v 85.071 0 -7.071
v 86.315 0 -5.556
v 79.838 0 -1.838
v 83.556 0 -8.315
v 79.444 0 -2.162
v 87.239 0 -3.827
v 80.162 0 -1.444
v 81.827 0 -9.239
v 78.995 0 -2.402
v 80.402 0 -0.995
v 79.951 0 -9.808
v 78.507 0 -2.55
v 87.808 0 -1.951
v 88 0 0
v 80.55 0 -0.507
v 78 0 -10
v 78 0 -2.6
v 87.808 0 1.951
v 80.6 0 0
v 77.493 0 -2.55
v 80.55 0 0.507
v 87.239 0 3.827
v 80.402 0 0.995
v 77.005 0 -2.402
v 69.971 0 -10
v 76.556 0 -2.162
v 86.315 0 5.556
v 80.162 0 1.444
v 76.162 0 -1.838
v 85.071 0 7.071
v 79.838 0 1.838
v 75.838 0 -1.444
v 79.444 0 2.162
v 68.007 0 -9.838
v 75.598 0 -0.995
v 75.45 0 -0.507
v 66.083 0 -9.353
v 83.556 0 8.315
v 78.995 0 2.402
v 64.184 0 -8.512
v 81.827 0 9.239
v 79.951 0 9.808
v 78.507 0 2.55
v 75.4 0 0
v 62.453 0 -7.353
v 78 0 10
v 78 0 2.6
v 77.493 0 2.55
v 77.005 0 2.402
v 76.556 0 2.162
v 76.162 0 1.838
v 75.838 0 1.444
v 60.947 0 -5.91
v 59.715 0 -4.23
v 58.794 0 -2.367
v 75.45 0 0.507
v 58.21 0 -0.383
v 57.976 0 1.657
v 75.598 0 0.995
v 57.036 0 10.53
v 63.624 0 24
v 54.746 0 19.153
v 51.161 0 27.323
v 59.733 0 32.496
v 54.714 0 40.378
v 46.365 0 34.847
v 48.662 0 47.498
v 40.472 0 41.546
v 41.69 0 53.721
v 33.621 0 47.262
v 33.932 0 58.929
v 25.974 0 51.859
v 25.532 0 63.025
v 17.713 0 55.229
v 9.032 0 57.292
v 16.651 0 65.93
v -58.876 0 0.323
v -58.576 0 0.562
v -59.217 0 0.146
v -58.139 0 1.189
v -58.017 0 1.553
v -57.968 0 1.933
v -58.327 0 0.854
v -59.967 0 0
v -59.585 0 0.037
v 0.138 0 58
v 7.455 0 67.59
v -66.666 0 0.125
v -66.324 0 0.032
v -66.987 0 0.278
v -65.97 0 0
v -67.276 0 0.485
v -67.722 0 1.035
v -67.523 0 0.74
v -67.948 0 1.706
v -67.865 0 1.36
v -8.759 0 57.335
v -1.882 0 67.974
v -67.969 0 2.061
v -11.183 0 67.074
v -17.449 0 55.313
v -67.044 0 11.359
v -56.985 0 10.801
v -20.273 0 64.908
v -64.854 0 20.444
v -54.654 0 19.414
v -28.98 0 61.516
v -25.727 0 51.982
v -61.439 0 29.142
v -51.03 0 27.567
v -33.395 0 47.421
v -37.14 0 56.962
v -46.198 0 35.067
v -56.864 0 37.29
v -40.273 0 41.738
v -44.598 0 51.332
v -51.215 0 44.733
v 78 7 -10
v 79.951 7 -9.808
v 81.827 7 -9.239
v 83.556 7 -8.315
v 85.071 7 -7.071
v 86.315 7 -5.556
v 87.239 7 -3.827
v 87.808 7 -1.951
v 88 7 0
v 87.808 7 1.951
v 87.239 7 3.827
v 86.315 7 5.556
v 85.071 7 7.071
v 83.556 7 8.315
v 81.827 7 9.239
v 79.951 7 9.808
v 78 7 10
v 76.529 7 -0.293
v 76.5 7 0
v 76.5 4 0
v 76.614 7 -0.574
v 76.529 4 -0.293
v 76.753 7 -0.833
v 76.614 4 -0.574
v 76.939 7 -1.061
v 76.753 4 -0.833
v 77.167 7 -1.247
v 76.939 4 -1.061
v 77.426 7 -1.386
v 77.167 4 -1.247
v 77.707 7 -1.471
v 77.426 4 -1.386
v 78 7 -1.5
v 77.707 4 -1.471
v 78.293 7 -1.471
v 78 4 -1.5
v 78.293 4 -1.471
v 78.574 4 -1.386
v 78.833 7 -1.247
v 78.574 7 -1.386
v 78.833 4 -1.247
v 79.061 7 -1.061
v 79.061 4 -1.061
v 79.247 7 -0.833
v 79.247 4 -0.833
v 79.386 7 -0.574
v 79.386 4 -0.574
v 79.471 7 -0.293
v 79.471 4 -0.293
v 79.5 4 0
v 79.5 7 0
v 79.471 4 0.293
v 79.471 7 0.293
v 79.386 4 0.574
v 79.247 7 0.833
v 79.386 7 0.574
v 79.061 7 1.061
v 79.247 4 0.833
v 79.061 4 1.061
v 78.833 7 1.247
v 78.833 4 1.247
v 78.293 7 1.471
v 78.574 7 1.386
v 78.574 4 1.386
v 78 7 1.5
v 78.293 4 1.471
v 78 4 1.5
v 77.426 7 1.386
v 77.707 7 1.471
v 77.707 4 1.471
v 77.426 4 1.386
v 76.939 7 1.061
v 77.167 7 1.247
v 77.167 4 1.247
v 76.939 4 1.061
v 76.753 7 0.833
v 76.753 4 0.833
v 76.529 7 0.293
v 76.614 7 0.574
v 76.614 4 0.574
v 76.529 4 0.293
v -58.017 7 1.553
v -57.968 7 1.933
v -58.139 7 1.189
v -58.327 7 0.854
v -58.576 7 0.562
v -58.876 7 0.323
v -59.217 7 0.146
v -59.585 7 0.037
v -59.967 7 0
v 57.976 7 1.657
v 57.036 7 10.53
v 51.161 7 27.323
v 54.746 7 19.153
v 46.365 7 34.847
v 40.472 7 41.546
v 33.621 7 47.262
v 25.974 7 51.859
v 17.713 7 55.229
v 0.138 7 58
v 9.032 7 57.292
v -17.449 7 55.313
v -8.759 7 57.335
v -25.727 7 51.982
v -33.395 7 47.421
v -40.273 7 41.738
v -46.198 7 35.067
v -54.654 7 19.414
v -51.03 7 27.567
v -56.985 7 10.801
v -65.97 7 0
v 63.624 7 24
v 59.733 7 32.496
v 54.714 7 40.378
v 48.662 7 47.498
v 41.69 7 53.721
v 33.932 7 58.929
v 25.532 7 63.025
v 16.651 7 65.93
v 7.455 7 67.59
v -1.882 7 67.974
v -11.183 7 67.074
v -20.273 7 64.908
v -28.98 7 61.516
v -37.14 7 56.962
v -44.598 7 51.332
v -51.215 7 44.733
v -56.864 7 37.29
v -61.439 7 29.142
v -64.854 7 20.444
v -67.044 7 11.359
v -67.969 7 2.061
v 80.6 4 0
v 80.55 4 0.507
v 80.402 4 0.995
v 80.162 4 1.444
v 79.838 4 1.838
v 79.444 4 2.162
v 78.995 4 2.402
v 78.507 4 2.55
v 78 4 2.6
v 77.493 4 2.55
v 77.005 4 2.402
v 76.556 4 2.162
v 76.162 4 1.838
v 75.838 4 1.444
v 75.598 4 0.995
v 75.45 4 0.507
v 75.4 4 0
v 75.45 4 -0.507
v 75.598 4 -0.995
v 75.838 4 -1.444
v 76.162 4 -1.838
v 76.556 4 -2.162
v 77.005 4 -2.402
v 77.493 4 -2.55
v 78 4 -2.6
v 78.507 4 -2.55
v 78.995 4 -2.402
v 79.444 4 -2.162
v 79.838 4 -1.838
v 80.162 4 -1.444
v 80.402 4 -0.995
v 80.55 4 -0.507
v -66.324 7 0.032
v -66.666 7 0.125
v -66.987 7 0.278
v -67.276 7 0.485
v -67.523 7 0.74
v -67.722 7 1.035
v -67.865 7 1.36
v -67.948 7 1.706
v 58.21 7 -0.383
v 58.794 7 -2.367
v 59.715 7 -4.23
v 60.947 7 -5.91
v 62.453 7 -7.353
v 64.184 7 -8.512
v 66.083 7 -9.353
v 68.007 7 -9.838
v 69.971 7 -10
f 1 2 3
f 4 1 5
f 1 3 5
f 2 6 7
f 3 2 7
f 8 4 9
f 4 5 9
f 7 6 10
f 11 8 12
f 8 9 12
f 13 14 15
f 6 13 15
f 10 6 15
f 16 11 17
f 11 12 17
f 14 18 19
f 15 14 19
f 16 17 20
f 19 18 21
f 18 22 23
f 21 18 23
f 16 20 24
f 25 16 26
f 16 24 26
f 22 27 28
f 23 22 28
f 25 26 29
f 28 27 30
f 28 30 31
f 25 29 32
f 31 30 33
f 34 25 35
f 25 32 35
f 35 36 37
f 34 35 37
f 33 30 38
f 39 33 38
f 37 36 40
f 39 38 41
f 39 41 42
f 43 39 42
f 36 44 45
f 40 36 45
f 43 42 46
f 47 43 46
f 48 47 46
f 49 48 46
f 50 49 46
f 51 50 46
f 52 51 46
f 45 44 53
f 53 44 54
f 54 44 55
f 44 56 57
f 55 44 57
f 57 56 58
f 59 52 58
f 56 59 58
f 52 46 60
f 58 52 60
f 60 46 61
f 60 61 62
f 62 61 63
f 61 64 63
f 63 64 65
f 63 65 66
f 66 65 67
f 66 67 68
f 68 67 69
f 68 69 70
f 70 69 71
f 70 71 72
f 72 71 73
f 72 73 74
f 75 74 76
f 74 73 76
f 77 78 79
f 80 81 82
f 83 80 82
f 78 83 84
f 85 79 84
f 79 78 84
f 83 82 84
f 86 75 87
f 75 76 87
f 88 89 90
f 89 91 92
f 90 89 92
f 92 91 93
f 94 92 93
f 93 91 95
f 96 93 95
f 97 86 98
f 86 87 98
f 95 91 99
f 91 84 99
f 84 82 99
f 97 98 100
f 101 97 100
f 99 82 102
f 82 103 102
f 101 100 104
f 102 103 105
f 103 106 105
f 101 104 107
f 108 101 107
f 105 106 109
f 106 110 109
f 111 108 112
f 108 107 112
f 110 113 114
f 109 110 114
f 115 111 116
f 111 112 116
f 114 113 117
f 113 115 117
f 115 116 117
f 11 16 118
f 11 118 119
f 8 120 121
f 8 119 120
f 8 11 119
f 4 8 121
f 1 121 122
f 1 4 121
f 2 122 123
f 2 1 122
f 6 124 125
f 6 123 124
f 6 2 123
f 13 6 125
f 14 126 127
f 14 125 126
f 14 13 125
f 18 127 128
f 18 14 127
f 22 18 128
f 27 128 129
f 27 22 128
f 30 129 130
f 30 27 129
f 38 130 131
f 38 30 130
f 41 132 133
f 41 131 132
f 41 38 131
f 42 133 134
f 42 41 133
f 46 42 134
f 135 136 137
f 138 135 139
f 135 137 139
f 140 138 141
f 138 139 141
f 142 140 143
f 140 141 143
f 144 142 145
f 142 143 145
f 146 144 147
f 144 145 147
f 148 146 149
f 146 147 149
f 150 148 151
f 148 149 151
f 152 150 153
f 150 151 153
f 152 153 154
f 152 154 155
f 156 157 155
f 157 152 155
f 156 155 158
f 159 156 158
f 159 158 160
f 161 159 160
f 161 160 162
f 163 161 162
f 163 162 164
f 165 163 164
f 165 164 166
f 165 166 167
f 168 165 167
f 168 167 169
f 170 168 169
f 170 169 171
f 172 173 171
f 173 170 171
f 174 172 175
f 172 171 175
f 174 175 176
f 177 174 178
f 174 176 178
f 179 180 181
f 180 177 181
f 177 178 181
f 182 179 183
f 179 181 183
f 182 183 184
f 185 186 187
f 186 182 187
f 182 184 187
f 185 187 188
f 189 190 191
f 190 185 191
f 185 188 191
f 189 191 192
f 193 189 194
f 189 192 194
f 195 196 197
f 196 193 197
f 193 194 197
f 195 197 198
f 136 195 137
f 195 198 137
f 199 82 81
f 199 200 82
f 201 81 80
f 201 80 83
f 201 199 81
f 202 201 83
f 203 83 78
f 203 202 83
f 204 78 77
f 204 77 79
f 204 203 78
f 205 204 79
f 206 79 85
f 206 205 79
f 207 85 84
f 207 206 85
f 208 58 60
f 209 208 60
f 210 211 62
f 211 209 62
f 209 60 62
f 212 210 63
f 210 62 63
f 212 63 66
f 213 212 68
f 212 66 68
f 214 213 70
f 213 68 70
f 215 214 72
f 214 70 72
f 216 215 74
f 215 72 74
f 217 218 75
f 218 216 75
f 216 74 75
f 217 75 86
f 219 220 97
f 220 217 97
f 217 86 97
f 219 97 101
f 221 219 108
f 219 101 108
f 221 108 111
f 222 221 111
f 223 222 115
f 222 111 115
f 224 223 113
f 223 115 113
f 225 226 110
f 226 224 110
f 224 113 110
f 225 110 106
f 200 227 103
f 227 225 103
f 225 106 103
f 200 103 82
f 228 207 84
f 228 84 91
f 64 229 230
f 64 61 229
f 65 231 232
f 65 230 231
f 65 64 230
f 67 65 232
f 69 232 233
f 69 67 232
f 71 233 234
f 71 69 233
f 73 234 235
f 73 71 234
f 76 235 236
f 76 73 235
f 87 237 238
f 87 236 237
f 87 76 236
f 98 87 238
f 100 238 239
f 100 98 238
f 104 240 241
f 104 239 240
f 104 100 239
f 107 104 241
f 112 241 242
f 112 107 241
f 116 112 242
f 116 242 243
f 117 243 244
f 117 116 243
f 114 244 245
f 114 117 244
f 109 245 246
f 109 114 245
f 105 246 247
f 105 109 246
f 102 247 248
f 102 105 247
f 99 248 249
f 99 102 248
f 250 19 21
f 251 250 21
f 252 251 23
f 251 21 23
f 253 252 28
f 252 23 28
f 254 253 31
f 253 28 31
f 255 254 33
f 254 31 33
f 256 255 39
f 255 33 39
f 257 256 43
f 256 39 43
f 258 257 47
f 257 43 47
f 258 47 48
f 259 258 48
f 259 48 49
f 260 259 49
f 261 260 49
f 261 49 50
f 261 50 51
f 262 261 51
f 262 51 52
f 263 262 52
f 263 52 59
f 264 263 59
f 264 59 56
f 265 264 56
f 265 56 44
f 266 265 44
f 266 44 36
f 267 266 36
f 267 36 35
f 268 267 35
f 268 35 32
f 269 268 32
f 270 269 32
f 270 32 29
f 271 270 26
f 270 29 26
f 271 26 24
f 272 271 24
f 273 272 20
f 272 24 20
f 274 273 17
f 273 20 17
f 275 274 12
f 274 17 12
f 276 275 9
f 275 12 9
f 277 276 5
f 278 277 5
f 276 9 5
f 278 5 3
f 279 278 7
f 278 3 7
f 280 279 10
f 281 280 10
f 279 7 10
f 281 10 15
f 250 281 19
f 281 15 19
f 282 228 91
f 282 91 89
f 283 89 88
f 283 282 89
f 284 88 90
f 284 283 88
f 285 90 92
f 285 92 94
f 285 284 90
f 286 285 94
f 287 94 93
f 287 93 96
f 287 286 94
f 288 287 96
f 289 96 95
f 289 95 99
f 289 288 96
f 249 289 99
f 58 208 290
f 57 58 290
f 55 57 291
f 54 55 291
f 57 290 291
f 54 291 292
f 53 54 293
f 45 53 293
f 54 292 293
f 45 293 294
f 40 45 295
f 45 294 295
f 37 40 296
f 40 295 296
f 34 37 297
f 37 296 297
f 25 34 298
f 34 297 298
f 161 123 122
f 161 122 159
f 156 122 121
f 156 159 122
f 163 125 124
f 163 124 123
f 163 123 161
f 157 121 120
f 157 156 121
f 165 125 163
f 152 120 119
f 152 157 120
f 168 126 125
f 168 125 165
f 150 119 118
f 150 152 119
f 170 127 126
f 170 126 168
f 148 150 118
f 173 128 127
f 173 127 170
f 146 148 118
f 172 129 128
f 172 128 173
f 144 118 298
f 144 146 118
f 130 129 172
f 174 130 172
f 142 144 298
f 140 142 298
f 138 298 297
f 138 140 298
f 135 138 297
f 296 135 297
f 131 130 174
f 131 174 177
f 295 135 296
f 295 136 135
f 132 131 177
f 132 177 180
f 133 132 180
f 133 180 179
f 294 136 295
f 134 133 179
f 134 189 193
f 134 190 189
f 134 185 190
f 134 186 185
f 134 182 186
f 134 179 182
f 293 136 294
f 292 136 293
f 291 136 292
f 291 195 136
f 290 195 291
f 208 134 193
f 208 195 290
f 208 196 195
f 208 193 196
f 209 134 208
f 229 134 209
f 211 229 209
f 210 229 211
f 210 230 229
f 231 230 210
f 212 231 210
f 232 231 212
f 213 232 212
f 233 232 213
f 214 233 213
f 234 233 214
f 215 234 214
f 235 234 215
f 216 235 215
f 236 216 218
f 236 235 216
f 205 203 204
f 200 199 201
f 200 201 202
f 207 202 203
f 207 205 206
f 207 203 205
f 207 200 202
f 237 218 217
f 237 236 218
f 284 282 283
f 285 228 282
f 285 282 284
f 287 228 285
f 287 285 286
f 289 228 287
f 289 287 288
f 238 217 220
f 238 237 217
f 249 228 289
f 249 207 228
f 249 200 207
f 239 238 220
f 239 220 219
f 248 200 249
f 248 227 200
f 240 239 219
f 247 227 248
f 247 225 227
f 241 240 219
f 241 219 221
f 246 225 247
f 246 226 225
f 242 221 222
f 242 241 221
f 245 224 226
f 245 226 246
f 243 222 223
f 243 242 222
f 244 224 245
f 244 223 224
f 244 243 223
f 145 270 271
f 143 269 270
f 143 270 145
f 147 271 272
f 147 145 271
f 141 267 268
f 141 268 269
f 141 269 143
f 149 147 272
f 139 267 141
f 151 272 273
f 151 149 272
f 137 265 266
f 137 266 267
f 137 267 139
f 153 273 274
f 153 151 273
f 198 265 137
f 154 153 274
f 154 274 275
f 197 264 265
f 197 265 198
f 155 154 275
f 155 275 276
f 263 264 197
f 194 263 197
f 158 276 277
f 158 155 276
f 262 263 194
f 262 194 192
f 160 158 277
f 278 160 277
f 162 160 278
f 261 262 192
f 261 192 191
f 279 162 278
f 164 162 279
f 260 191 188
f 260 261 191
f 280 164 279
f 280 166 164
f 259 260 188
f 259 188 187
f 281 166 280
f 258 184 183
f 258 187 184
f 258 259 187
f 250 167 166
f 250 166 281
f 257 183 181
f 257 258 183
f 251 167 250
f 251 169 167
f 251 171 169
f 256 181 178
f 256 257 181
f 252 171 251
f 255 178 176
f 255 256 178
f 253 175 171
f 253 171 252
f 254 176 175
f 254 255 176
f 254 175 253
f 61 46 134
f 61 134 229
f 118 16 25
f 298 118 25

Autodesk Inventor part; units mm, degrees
ref_plane "YZ Plane" through (0, 0, 0) normal (1, 0, 0) x (0, 1, 0)
ref_plane "XZ Plane" through (0, 0, 0) normal (0, 1, 0) x (-1, 0, 0)
ref_plane "XY Plane" through (0, 0, 0) normal (0, 0, 1) x (1, 0, 0)
sketch "Esquisse1" plane through (0, 0, 0) normal (0, 1, 0) x (-1, 0, 0)
  arc A0 (58, 0) -> (-58, 0) centre (0, 0) ccw
  arc A1 (68, 0) -> (-68, 0) centre (0, 0) ccw
  line L0 (58, 0) -> (68, 0)
  circle A2 centre (-78, 0) radius 10
  circle A3 centre (-78, 0) radius 1.5
  line L1 (-78, 10) -> (-58.201, 10) construction
  line L2 (-78, 10) -> (-63.6239, 24)
  line L3 (-78, -10) -> (-58, -10)
  line L4 (-58, 0) -> (-58, -10)
  dimension "d9" = 58
  dimension "d10" = 68
  dimension "d11" = 20
  dimension "d12" = 20
  dimension "d13" = 3
extrude "Extrusion1" add sketch "Esquisse1" along normal blind 7
sketch "Esquisse2" plane through (0, 0, 0) normal (0, -1, 0) x (1, 0, 0)
  circle A0 centre (78, 0) radius 2.6
  point P0 (0, 0)
  dimension "d16" = 5.2
extrude "Extrusion2" cut sketch "Esquisse2" against normal blind 4
fillet "Congé1" radius 12 1 edges at (58, 3.5, -10)
fillet "Congé2" radius 2 2 edges at (-68, 3.5, 0) (-58, 3.5, 0)
properties part number "bras_pince_gauche"
